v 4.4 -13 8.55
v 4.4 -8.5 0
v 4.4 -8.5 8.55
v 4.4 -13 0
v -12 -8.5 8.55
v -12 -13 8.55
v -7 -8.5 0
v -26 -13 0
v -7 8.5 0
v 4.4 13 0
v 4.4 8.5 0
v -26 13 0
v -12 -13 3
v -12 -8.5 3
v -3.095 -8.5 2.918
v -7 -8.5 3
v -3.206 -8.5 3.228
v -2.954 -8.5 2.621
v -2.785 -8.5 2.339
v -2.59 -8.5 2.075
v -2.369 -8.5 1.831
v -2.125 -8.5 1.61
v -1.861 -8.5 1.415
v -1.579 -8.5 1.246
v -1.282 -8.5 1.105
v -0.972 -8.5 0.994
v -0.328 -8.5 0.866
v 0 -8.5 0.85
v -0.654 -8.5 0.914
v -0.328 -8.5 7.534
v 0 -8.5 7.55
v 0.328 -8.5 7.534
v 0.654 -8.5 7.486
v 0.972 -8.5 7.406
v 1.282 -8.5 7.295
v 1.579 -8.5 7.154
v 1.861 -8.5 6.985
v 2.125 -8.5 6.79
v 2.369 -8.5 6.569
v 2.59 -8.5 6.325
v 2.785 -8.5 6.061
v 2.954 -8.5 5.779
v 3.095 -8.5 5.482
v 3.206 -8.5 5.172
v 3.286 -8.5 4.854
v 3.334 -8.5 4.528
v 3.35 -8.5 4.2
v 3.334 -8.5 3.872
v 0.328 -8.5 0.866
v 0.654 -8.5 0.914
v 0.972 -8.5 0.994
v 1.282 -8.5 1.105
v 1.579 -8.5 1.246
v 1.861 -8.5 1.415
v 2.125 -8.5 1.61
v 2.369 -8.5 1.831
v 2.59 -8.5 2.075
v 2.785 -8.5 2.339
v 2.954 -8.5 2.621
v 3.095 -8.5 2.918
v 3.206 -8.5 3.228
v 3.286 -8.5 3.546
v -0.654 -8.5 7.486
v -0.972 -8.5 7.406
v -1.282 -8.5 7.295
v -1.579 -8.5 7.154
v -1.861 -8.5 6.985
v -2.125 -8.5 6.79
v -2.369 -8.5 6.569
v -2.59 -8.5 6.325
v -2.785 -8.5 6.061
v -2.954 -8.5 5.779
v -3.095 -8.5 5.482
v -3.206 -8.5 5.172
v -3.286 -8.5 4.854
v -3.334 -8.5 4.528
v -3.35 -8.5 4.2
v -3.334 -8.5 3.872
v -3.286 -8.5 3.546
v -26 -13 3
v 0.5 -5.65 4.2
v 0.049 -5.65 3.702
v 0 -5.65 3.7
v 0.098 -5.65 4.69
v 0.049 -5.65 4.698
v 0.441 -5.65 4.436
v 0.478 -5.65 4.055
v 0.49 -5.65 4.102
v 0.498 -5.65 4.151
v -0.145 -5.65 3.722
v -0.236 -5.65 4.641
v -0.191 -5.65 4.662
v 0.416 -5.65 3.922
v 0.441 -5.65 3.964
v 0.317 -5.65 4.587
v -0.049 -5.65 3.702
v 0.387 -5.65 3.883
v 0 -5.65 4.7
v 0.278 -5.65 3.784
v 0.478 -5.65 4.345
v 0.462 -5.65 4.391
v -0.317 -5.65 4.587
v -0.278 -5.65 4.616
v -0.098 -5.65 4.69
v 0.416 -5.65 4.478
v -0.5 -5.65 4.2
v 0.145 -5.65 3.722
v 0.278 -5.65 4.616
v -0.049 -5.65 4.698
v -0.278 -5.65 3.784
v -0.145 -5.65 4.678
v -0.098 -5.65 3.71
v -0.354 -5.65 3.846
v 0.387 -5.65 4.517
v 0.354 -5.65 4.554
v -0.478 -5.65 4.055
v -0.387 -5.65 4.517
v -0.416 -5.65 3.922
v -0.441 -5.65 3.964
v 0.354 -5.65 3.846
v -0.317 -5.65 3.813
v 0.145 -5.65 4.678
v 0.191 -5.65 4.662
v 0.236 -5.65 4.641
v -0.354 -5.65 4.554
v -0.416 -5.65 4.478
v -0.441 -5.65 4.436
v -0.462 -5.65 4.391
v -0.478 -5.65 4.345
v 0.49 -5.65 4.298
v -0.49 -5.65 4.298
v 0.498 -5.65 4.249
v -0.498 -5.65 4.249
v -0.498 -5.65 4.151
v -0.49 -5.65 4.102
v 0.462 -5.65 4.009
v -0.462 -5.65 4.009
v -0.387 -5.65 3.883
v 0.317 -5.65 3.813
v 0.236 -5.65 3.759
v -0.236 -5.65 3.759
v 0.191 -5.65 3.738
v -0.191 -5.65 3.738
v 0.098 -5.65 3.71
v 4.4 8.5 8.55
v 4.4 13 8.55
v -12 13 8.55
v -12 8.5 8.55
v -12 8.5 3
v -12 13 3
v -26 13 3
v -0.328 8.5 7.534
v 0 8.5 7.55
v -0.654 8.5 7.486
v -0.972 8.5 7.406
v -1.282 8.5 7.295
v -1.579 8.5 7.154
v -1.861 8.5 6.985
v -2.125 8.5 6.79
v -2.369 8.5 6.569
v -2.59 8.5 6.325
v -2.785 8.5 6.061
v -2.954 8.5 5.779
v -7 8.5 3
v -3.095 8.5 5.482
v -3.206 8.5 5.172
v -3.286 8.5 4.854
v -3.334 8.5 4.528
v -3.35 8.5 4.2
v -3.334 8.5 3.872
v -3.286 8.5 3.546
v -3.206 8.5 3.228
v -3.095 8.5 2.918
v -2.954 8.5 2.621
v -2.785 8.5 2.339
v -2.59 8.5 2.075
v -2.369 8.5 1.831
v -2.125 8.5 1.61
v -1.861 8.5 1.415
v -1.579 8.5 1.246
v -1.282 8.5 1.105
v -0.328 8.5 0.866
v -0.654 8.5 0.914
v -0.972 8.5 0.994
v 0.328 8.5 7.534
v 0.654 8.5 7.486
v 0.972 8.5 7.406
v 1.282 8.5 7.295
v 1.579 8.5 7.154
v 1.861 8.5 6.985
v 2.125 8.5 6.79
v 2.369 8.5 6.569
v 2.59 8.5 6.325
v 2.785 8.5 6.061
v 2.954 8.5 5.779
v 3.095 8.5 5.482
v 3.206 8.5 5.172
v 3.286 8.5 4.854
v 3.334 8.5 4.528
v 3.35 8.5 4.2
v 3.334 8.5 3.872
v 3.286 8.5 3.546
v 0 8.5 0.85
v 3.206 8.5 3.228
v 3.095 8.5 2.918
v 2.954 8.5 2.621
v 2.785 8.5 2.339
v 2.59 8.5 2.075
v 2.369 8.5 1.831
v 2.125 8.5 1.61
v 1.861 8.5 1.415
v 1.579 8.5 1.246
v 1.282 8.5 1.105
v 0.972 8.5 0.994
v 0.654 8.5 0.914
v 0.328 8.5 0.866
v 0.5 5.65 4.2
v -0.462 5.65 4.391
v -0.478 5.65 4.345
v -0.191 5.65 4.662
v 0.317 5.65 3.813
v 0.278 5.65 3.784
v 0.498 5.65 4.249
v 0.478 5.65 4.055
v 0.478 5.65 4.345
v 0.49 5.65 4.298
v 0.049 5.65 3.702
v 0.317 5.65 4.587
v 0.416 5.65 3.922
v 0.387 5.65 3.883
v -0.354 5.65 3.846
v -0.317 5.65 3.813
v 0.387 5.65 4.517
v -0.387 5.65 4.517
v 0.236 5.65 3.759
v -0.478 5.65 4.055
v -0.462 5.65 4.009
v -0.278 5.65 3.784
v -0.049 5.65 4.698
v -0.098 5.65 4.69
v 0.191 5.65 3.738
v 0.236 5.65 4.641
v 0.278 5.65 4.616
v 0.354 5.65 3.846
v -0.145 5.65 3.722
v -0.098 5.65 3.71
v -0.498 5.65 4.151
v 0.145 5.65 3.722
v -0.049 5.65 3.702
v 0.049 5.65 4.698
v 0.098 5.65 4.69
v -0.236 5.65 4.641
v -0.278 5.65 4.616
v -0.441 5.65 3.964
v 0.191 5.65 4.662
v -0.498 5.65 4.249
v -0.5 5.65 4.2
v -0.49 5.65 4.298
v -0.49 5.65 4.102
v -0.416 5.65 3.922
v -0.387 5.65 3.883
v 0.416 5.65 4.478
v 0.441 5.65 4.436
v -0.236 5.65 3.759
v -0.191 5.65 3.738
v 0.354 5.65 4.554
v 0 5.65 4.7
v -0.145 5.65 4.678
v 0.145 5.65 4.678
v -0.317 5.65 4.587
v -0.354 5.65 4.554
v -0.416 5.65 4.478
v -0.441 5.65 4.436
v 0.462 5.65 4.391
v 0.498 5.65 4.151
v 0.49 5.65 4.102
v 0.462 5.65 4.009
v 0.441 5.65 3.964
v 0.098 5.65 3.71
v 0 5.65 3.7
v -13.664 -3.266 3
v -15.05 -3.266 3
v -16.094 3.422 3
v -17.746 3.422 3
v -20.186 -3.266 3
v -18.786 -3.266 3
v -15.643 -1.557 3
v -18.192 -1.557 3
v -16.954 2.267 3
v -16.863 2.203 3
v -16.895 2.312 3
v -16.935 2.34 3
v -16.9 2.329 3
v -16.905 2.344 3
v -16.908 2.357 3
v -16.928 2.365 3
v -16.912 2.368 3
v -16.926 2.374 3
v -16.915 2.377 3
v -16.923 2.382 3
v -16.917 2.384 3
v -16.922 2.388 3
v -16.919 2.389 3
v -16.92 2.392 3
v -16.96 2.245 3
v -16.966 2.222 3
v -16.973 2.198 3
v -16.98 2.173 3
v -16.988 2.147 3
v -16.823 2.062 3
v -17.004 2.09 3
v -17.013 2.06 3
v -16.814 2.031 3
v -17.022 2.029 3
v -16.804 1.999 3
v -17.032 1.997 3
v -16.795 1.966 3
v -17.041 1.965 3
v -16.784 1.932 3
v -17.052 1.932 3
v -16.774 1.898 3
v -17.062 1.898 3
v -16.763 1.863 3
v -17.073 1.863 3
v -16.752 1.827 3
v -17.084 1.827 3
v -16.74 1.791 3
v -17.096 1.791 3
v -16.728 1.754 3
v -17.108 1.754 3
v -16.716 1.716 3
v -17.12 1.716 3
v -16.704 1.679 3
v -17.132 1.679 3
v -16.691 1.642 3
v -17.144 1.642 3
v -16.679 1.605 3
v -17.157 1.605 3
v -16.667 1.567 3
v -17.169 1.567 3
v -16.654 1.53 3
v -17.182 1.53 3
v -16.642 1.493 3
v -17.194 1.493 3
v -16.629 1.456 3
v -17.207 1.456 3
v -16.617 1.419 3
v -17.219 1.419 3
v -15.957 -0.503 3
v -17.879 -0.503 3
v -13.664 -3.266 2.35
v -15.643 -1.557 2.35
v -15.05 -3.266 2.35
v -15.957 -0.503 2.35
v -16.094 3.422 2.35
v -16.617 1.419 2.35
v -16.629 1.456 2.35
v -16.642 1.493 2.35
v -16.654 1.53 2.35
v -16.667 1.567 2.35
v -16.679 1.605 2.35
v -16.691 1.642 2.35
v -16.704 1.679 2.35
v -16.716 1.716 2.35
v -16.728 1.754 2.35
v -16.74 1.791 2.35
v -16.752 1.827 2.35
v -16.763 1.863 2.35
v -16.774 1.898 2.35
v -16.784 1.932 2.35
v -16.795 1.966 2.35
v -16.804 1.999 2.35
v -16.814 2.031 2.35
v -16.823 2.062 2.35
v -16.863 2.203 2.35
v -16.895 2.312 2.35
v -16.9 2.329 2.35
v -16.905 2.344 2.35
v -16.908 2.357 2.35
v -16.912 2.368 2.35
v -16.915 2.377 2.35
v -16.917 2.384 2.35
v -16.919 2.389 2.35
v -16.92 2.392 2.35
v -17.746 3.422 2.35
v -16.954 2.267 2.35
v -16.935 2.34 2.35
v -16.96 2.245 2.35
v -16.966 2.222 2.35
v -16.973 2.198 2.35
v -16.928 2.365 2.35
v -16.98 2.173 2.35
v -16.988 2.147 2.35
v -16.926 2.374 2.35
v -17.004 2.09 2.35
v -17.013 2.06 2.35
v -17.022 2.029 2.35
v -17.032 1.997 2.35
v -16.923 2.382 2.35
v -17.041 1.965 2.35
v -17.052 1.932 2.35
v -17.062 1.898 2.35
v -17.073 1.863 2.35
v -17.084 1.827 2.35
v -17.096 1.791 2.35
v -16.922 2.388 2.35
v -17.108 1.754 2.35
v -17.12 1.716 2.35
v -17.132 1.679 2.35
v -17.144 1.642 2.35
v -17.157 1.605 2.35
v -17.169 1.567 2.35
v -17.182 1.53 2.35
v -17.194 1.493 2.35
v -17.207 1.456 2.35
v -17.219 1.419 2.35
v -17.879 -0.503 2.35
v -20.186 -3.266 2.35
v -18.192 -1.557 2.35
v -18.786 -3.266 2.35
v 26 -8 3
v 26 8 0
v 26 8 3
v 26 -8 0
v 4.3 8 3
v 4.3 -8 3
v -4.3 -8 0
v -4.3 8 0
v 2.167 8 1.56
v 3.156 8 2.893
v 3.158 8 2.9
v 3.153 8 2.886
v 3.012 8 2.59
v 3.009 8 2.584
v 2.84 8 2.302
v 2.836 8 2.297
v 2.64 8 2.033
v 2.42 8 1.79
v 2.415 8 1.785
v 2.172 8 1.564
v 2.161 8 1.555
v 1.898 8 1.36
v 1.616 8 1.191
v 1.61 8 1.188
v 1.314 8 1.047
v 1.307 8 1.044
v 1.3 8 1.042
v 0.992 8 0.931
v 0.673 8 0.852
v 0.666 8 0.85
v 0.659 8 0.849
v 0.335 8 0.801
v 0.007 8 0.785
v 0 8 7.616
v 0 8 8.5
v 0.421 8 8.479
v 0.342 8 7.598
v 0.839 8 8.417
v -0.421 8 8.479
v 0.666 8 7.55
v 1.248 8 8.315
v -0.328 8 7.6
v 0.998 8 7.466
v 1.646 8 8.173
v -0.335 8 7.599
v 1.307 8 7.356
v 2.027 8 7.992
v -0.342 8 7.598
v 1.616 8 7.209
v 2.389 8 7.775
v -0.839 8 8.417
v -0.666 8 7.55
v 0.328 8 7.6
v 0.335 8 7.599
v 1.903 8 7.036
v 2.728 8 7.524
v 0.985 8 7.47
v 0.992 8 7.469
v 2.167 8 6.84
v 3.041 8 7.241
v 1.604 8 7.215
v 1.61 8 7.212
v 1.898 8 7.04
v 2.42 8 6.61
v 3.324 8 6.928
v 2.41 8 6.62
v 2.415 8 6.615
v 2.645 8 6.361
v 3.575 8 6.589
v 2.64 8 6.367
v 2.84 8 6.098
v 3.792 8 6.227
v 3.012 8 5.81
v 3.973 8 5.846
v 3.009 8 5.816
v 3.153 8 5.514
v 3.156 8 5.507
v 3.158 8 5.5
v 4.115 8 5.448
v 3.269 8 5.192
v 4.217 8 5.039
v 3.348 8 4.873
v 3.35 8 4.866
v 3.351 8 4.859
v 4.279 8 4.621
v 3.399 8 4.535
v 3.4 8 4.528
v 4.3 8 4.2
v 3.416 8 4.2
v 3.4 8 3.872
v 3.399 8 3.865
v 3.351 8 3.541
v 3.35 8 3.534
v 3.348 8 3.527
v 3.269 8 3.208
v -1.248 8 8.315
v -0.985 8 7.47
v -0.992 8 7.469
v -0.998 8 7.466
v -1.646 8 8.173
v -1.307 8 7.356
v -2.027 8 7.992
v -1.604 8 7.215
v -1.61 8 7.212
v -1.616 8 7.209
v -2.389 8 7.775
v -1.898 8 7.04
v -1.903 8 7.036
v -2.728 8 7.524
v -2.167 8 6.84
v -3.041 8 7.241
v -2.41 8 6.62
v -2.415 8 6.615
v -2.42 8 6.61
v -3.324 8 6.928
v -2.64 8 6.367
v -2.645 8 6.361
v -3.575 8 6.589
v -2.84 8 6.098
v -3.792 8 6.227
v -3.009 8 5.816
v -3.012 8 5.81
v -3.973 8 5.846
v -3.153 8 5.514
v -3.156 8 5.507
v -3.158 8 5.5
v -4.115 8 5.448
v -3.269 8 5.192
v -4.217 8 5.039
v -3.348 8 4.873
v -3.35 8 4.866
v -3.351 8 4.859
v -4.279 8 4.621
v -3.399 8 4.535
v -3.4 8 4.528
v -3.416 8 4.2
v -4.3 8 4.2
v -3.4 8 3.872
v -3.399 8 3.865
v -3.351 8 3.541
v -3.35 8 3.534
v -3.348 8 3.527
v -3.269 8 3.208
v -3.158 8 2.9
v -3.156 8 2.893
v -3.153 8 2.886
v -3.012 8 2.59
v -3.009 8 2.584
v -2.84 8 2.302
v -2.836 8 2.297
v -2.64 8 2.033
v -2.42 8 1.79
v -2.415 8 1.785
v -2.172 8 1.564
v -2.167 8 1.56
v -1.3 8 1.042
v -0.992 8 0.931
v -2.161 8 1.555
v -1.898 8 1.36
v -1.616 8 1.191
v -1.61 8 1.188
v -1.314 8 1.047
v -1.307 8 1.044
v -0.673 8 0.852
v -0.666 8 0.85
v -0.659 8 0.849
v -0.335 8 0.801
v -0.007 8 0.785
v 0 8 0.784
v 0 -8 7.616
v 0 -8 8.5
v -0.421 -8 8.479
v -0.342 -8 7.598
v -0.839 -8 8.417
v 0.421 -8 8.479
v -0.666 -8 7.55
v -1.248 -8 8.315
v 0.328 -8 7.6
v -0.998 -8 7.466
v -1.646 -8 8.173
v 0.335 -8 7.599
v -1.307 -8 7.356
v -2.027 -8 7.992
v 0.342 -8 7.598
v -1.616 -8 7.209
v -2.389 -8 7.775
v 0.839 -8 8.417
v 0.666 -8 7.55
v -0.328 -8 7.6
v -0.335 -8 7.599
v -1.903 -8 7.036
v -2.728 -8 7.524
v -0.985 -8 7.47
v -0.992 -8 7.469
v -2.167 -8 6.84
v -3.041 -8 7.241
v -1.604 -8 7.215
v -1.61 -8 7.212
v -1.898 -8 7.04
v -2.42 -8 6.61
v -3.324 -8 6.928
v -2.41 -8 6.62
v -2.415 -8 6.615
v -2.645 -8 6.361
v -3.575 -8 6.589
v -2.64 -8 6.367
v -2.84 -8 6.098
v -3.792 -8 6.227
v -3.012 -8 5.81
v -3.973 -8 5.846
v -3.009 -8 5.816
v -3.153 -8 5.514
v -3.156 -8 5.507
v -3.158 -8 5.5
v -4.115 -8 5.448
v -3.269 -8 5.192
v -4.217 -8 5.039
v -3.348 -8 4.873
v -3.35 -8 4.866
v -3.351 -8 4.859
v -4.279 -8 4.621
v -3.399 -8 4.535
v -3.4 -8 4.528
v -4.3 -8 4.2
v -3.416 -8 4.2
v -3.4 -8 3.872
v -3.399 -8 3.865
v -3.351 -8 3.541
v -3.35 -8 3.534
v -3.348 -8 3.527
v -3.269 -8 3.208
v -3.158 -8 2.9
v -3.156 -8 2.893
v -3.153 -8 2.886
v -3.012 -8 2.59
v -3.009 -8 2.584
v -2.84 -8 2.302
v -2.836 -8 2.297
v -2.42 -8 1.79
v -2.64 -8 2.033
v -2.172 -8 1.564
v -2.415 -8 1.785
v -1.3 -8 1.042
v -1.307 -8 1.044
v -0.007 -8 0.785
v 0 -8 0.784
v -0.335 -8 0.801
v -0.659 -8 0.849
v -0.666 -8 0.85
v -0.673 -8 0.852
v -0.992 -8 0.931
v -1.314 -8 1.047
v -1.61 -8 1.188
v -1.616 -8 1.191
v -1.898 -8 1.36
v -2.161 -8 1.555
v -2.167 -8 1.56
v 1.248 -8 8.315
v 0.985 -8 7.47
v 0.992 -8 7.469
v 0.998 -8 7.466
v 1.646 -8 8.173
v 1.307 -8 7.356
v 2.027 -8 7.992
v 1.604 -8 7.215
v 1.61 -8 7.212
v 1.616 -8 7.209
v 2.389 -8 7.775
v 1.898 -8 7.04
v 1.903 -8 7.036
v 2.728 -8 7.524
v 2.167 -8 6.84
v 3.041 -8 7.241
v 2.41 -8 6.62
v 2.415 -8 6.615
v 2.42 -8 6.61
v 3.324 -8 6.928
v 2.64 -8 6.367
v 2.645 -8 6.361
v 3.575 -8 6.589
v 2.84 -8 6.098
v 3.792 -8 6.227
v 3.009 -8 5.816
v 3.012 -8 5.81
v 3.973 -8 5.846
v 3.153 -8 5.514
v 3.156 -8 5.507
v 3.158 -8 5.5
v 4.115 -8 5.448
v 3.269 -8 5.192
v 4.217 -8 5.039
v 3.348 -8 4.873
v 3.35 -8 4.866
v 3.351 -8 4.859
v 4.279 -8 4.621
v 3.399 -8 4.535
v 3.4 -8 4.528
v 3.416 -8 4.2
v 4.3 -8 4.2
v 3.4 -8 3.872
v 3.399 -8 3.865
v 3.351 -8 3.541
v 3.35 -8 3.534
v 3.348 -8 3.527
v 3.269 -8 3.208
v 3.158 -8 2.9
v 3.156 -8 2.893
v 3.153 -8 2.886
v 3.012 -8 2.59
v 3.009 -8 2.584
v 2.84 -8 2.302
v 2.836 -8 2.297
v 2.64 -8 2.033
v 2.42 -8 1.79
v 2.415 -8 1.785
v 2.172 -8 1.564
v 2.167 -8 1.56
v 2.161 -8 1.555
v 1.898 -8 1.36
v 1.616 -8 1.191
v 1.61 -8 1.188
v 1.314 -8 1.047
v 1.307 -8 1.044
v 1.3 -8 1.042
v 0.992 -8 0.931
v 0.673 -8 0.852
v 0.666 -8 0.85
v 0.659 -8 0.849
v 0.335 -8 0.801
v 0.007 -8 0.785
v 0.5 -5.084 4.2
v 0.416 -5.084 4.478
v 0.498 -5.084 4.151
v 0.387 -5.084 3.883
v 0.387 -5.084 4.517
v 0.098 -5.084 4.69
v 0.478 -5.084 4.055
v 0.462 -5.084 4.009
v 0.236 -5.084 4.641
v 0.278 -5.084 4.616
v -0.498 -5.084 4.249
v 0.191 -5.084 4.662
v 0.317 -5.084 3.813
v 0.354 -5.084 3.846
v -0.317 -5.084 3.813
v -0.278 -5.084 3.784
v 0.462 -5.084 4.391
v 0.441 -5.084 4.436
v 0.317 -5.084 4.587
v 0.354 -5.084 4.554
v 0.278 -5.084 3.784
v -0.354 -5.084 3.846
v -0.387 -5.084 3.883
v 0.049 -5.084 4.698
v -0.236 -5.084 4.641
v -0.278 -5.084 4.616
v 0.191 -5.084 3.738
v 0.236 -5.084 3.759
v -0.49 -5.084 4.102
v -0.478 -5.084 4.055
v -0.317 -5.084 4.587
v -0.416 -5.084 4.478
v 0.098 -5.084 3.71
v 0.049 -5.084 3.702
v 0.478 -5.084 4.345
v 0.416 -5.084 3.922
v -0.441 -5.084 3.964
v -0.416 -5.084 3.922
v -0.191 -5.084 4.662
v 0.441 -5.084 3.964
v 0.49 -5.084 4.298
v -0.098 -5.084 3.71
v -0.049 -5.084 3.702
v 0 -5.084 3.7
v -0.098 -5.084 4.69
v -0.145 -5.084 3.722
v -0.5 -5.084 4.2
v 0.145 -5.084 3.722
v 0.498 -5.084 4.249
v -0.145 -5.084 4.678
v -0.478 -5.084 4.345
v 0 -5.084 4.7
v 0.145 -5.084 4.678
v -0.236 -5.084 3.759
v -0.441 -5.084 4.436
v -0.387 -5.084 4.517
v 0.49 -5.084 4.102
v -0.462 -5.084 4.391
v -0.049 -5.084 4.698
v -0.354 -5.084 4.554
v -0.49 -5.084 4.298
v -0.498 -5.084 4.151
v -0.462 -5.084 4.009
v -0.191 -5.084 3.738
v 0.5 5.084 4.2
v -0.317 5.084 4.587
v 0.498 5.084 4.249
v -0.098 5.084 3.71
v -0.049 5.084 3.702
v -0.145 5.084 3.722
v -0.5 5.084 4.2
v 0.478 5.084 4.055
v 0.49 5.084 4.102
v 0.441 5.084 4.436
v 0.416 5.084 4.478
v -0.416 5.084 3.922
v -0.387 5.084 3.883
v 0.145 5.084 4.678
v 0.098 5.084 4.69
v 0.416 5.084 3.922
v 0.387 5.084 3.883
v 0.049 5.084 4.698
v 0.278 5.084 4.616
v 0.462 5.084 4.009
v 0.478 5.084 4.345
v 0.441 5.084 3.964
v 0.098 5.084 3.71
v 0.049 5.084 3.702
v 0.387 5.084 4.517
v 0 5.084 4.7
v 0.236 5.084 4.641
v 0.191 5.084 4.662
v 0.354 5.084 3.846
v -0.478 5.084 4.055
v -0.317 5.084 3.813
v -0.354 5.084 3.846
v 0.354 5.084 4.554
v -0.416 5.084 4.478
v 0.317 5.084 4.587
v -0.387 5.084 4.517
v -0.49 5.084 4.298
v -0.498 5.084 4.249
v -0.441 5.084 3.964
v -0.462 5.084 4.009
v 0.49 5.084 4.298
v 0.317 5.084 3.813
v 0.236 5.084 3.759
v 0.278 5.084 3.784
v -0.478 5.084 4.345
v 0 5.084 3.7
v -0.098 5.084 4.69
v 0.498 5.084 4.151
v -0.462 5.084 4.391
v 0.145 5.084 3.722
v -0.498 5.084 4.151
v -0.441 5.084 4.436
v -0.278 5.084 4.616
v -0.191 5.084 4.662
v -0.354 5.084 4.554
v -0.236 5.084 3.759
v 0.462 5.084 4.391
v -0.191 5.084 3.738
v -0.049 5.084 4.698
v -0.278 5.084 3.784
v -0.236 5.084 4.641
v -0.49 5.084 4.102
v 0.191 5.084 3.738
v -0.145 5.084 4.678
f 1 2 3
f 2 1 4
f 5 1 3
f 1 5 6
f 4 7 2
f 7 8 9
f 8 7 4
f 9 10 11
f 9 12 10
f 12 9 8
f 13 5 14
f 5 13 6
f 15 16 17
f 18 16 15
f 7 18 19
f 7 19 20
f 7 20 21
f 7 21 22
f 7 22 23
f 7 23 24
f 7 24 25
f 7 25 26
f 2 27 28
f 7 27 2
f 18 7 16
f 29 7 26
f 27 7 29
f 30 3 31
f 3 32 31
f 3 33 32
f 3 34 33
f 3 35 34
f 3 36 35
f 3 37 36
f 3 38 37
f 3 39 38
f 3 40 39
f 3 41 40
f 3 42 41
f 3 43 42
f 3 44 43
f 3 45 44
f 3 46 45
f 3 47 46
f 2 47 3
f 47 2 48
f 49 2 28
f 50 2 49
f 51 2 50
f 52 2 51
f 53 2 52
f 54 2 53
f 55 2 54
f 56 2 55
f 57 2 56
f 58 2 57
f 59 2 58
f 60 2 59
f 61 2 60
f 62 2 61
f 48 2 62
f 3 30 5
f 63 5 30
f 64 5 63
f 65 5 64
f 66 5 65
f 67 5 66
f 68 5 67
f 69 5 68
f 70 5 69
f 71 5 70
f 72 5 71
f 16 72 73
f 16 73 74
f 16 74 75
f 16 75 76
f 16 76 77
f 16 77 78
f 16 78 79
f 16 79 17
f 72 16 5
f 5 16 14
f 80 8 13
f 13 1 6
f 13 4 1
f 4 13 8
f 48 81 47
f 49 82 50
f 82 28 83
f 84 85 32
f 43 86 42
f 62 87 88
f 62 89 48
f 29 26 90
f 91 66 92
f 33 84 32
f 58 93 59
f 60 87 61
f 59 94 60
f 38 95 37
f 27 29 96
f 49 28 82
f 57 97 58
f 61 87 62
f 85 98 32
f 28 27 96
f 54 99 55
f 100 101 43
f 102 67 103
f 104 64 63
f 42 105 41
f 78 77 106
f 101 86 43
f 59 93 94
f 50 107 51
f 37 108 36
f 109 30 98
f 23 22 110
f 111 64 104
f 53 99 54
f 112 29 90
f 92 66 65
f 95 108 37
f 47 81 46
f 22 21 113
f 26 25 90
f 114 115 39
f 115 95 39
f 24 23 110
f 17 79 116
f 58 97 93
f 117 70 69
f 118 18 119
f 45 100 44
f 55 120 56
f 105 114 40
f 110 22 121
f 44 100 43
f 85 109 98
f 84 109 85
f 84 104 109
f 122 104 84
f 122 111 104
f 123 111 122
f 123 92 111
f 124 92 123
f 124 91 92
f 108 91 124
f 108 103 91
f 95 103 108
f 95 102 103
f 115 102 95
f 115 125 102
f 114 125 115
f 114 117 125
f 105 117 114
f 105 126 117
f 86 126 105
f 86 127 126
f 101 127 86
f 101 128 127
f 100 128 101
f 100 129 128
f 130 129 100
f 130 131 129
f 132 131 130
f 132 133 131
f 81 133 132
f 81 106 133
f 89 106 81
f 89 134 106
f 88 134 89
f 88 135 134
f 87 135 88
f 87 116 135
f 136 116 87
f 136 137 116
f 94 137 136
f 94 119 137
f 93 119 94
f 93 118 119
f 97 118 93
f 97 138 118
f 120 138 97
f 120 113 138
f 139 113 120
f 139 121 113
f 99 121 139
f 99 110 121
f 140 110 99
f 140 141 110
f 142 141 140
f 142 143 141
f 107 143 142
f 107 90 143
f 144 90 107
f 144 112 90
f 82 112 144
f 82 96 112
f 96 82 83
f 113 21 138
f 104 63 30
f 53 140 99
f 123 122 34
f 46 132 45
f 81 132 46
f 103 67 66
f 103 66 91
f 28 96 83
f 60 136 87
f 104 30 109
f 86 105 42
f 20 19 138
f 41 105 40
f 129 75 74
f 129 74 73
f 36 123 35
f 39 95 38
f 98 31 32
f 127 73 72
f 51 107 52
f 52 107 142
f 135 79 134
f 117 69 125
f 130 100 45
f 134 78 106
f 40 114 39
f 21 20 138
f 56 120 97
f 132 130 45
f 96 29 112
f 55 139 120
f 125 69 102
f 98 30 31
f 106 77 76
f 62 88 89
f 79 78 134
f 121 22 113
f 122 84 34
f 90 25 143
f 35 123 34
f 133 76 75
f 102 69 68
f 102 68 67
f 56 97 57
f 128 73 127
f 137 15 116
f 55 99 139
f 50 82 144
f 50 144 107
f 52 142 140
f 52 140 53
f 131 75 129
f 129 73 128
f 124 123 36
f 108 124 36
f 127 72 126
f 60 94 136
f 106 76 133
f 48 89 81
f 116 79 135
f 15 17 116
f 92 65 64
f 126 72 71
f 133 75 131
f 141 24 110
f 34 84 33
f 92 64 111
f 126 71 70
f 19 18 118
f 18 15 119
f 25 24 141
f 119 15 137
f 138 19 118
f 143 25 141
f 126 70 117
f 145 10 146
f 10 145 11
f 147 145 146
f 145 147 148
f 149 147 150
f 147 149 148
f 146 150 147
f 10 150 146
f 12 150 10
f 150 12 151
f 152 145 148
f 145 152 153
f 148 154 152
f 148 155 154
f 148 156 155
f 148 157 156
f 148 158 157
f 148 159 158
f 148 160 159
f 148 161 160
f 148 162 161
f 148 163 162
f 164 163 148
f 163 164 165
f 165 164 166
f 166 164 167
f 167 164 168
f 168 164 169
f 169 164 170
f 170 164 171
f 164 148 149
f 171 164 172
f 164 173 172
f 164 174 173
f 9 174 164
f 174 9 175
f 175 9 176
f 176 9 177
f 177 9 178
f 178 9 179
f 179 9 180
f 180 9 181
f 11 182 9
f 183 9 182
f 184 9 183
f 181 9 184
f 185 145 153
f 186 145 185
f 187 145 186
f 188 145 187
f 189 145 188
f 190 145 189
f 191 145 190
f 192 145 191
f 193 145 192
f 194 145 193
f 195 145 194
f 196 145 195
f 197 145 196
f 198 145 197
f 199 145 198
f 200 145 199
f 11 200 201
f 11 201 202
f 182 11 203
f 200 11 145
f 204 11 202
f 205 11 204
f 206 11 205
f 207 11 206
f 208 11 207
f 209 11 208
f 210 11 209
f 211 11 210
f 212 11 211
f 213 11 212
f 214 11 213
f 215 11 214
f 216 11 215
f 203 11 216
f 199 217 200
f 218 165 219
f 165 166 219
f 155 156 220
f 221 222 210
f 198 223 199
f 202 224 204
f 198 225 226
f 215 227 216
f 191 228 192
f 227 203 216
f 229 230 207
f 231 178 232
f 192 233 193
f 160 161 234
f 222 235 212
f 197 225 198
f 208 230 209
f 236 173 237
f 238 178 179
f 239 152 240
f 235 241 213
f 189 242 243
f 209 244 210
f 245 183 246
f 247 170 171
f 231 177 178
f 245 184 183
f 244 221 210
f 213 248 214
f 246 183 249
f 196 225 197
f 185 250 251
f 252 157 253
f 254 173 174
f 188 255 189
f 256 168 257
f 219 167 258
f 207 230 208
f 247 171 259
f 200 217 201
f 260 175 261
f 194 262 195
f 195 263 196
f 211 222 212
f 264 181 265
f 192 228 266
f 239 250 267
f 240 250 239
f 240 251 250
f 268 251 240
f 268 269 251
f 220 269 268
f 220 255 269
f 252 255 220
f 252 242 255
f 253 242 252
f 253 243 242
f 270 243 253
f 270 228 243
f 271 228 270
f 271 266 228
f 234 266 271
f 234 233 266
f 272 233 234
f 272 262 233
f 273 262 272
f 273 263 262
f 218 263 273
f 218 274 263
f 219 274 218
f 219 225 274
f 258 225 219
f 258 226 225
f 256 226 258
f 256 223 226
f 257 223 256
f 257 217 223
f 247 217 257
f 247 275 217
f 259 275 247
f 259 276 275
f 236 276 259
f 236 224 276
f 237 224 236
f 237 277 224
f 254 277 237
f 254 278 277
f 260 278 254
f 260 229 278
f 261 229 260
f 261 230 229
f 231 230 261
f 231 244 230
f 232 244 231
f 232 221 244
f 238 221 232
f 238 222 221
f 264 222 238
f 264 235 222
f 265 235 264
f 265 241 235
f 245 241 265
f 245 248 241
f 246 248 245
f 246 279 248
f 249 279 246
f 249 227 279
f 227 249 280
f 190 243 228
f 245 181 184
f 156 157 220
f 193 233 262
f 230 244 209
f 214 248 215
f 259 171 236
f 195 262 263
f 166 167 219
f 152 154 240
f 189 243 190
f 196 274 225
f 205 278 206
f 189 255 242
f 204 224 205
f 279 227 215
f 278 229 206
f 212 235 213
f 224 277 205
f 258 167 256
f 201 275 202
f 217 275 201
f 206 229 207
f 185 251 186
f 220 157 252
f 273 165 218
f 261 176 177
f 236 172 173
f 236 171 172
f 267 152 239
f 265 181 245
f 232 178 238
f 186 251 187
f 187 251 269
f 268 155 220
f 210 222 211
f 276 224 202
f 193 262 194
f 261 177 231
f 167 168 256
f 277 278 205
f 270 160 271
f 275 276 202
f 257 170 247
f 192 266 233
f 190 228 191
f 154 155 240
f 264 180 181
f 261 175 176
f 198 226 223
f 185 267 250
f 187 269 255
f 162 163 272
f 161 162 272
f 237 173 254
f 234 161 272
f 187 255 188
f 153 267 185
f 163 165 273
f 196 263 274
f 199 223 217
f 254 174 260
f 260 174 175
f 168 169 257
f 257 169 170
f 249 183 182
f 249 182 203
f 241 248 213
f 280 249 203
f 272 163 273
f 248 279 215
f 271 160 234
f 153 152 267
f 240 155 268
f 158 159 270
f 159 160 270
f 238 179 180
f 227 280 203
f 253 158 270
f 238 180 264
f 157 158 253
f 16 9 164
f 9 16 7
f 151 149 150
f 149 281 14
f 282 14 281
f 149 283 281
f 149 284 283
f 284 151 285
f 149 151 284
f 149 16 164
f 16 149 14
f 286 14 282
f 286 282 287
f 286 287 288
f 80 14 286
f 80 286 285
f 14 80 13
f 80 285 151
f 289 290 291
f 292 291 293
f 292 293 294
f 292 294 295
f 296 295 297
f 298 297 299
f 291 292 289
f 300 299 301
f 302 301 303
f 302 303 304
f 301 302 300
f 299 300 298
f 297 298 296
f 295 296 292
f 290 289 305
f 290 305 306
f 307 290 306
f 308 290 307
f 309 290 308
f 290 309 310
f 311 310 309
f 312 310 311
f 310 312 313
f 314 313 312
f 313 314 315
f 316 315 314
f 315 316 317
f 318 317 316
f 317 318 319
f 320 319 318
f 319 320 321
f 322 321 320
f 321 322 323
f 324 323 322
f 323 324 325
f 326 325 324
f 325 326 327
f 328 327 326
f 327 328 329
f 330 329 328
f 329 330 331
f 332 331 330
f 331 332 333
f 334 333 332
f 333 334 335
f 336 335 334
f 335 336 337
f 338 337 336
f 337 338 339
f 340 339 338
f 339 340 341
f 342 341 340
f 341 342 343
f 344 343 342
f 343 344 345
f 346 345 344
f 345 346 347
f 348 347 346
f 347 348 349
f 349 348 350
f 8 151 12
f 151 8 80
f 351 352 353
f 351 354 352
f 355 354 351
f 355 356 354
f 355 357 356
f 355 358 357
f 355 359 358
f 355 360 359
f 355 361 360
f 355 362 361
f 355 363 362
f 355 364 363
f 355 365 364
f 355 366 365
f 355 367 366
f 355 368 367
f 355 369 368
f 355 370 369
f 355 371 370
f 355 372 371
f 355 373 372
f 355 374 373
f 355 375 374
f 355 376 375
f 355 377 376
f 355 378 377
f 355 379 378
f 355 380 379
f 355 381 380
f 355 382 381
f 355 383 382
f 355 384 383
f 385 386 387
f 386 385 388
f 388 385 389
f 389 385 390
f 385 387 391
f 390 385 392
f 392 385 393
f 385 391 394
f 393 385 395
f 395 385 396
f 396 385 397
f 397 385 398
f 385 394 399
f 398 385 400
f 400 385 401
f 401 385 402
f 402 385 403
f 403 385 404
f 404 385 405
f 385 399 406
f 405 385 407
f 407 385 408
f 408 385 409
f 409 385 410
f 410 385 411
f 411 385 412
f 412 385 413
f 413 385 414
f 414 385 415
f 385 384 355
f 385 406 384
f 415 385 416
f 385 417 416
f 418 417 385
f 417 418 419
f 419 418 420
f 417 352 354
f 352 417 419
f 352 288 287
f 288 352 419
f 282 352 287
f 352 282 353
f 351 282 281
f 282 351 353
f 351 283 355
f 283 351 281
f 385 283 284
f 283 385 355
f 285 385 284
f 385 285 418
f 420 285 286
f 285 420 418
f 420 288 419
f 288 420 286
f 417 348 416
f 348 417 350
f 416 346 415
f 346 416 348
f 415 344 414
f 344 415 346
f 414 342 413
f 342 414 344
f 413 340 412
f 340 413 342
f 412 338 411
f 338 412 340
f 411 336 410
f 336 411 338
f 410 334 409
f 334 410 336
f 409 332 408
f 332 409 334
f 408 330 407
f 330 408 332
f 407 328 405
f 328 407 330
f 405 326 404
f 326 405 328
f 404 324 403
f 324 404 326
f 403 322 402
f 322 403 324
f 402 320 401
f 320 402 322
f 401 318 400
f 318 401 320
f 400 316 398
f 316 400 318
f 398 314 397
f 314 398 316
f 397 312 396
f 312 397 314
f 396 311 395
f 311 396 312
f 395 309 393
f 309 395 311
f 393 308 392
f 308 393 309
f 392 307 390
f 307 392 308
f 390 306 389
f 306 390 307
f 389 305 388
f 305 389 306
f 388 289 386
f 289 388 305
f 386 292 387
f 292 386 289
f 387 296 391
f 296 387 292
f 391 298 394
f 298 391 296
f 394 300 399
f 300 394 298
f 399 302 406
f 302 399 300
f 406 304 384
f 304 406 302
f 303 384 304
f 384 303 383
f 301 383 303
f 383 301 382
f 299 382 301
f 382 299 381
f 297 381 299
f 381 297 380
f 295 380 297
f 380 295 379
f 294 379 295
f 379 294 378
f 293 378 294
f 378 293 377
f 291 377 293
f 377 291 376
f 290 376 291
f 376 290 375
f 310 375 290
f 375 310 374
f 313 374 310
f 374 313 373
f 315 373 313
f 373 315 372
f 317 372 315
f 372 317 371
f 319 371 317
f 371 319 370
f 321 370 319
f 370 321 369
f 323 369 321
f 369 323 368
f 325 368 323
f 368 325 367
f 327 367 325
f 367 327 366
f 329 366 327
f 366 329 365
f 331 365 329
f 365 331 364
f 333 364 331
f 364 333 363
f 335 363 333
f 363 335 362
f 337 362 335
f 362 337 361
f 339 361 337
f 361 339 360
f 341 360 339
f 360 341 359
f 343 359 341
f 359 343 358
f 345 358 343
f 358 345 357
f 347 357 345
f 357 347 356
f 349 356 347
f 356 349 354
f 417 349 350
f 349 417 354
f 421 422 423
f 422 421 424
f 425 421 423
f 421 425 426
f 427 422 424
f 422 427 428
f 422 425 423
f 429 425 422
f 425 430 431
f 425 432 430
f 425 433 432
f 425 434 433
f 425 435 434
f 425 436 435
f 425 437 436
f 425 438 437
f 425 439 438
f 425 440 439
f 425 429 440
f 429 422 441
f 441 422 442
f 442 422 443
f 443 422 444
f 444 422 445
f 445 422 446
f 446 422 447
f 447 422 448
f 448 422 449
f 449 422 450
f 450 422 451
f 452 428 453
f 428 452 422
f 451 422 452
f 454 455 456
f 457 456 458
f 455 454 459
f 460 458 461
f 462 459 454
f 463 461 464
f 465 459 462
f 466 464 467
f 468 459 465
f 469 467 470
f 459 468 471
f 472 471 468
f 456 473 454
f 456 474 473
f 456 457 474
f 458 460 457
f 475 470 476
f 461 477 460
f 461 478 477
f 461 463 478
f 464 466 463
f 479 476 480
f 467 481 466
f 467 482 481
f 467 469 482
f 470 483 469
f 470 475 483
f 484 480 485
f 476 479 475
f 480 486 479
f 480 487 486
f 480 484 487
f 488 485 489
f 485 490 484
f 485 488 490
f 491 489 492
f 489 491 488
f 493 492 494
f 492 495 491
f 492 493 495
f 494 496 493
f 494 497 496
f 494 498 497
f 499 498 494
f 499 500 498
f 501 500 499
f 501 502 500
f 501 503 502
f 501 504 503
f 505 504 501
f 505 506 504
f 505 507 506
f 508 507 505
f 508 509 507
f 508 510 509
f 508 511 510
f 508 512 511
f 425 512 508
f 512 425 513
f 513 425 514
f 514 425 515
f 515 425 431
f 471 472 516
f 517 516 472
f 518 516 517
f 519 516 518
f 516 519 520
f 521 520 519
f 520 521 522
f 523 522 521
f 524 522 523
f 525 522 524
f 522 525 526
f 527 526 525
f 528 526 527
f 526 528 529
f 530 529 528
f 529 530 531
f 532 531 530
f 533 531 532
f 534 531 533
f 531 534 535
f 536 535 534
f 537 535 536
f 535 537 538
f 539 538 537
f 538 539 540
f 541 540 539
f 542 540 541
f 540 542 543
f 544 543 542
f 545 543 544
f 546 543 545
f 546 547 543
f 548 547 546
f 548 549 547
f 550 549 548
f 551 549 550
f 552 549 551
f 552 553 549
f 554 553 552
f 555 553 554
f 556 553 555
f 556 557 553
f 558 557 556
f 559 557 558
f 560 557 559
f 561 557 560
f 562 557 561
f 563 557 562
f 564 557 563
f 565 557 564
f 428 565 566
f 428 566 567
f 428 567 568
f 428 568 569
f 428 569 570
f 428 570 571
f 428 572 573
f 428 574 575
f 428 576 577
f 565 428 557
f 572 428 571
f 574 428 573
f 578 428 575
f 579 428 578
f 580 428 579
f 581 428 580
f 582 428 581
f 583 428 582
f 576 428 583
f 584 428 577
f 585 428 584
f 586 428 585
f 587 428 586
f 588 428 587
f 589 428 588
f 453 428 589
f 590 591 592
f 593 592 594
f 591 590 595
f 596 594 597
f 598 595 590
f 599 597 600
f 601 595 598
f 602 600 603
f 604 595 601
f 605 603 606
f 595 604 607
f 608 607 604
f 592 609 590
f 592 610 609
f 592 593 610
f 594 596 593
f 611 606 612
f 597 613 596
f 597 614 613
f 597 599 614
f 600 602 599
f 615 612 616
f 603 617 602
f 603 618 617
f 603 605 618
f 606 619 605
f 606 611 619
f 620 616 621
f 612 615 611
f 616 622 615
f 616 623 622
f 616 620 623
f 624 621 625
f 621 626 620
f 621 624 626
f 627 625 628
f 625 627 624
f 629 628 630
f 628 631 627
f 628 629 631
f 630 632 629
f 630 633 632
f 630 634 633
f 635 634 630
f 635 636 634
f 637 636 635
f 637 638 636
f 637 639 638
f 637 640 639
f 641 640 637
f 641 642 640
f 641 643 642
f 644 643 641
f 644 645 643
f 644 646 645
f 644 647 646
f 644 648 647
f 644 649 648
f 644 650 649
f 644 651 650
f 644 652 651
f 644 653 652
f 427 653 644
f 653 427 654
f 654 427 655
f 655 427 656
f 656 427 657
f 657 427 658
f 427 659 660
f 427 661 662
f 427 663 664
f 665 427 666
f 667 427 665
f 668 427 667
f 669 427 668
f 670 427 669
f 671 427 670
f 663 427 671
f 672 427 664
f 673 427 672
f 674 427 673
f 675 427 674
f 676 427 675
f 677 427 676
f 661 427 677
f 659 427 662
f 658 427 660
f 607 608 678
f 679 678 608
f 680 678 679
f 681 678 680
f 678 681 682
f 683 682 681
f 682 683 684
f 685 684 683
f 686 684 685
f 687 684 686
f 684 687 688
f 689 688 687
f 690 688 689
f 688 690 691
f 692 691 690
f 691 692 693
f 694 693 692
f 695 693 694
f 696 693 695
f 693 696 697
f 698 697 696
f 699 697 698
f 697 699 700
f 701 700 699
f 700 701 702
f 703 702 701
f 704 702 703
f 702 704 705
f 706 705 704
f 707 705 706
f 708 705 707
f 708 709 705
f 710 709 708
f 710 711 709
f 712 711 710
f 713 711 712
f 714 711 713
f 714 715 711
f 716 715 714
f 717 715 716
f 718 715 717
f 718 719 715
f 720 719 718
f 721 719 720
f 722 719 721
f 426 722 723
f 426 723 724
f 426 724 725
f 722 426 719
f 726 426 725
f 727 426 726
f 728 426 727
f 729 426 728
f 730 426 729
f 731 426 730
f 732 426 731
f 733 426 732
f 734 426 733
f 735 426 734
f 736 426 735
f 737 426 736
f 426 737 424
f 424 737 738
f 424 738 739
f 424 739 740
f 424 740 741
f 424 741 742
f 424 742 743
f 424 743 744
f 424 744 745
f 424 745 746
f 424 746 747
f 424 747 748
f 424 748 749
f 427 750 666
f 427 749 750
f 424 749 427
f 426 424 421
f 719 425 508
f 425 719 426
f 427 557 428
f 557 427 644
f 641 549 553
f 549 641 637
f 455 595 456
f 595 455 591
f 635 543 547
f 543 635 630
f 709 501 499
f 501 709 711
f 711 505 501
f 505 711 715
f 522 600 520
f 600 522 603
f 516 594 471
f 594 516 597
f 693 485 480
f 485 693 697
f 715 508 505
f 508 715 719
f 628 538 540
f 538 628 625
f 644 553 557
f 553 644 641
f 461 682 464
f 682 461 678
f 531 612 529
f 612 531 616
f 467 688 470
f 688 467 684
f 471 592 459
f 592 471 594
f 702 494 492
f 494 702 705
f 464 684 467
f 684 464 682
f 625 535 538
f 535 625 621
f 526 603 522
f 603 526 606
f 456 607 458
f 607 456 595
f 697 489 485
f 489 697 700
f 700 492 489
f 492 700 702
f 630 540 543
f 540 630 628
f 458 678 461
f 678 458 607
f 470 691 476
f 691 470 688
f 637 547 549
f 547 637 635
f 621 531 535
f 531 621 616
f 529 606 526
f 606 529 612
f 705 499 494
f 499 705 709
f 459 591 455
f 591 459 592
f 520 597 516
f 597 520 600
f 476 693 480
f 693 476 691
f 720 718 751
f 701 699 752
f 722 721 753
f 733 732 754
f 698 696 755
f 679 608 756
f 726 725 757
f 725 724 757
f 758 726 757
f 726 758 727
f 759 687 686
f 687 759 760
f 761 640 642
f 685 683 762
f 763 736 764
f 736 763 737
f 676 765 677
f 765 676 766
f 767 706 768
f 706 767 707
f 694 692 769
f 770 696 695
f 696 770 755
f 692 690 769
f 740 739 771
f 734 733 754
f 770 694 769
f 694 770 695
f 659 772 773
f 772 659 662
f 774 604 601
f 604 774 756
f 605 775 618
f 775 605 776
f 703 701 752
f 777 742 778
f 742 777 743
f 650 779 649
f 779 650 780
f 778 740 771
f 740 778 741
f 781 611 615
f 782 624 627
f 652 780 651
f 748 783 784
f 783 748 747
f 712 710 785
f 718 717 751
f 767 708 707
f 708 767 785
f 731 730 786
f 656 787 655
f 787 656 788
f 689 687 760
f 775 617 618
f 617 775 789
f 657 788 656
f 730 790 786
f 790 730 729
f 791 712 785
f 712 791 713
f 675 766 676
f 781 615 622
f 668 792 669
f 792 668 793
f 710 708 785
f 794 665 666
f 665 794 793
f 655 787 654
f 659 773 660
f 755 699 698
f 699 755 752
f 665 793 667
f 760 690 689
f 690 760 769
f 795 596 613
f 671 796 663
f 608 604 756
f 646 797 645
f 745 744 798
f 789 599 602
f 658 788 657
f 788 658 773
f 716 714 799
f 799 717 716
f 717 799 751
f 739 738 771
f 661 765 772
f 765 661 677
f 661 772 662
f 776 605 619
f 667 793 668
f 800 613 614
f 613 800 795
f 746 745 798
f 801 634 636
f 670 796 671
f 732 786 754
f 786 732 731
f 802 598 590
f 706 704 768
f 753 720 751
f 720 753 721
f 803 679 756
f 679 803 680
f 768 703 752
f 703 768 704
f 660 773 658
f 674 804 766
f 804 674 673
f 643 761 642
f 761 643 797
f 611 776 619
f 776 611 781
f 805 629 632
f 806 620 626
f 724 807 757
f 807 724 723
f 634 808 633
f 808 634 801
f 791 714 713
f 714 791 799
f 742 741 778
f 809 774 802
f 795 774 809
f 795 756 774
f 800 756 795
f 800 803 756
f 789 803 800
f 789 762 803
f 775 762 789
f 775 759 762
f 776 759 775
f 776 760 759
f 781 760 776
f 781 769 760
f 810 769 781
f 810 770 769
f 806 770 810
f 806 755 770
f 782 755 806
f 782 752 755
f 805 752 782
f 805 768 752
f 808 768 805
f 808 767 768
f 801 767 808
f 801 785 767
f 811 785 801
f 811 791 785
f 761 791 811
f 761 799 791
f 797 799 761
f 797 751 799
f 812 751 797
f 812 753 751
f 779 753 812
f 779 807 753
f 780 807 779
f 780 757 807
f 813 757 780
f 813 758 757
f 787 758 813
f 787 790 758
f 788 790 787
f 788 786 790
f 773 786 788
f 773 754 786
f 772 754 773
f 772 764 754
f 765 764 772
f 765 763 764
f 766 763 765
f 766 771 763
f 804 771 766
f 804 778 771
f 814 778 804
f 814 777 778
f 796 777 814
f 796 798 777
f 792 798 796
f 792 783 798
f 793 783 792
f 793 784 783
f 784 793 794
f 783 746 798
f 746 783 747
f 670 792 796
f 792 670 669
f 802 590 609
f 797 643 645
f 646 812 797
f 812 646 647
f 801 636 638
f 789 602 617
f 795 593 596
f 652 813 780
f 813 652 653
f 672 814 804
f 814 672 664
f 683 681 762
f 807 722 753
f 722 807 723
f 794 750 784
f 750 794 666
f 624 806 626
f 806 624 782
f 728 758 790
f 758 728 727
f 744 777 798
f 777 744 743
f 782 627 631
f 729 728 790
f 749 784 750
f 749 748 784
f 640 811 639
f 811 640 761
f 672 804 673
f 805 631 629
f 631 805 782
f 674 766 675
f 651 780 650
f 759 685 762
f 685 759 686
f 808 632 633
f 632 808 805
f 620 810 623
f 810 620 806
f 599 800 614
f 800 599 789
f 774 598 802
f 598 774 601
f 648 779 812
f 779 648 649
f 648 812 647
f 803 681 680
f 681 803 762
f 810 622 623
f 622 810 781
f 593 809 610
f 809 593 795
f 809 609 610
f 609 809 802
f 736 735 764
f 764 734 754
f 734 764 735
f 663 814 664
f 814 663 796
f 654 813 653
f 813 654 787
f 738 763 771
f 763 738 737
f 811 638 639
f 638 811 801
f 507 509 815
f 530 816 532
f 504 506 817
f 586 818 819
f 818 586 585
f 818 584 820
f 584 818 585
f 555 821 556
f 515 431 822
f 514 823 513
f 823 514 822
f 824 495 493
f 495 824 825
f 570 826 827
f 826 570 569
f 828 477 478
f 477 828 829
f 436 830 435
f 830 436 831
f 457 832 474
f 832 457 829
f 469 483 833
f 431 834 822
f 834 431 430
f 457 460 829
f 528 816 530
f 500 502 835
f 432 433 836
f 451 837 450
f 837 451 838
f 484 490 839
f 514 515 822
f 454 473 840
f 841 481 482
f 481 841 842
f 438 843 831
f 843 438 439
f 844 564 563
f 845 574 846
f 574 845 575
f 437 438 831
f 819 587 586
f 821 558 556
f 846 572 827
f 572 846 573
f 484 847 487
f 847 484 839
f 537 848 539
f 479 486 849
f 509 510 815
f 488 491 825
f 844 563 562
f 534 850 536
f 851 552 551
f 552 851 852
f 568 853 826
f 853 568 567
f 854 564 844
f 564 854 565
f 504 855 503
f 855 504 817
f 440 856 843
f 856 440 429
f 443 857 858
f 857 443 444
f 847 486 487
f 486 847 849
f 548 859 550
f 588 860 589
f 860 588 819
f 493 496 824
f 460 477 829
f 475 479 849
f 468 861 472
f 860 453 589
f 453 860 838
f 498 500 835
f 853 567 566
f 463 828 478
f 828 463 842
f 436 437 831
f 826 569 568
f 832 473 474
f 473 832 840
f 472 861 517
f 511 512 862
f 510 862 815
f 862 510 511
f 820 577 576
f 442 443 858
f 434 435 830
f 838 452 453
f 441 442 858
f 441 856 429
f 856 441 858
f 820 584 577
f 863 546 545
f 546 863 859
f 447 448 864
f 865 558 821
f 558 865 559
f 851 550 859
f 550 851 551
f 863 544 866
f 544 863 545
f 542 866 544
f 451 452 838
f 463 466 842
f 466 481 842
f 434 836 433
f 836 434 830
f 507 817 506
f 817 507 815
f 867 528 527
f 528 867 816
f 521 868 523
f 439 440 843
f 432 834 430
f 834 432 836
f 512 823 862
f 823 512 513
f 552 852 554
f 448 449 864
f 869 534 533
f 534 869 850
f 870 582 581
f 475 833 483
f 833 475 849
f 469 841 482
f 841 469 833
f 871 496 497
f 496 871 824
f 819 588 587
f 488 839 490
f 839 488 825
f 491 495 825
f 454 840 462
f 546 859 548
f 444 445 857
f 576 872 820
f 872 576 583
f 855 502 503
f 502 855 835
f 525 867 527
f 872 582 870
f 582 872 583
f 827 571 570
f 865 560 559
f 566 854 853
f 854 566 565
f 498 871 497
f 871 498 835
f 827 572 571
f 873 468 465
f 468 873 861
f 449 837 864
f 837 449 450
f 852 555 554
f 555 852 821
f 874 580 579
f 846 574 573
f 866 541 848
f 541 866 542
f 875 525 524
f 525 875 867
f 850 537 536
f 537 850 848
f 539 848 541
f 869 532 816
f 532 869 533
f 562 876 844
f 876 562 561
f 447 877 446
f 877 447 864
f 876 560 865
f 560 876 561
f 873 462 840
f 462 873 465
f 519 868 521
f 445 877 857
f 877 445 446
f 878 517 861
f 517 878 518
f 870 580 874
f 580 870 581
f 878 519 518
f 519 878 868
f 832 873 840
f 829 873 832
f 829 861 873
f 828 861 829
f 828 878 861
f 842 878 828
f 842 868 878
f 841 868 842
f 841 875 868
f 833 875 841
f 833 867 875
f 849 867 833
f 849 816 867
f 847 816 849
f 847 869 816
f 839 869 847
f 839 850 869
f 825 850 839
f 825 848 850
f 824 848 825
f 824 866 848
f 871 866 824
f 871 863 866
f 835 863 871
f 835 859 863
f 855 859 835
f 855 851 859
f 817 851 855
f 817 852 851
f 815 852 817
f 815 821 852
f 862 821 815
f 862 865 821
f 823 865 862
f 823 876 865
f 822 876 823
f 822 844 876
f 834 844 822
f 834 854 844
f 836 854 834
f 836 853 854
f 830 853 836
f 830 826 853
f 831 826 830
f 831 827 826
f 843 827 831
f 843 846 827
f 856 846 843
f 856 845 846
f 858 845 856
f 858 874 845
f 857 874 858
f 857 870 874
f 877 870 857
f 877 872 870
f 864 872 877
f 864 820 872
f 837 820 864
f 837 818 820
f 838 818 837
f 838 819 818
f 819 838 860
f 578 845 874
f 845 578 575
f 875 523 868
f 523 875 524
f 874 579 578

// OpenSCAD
// Opposed cone bearings adapted from the CrowPanel folding stand.
// Units mm. Print as supplied, broad feet on the build plate.
part="test"; // test, left, right, section
gap=0.4; // normal clearance, use 0.5 if the first print fuses
$fn=64;
axis_height=4.2;
radius=3.35;
cone_depth=2.85;
axial_gap=0.5;
// Hinge axis is Y. The cheeks and socket feet all touch the bed.
module cone(y,d,clearance=0){
    translate([0,y,axis_height]) rotate([-90*d,0,0])
        cylinder(h=cone_depth+clearance*sqrt(2),
        r1=radius+clearance*sqrt(2),r2=radius-cone_depth);
}
module foot(x0,x1,y0,y1,h){
    translate([x0,y0,0]) cube([x1-x0,y1-y0,h]);
}
module left_unmarked(){
    union(){
        foot(-26,-7,-13,13,3);
        // Each cheek connects to its own broad foot.
        for(d=[-1,1]){
            foot(-12,4.4,d<0?-13:8.5,d<0?-8.5:13,axis_height+radius+1);
            cone(d*8.5,-d);
        }
    }
}
module right_untrimmed(){
    difference(){
        union(){
            foot(7,26,-8,8,3);
            foot(0,12,-8,8,3);
            // Round top, bed-supported lower half, like the earlier stand.
            foot(-4.3,4.3,-8,8,axis_height);
            translate([0,-8,axis_height]) rotate([-90,0,0])
                cylinder(h=16,r=4.3);
        }
        for(d=[-1,1]) cone(d*8.5,-d,gap);
    }
}
// Trim the barrel's 0.10 mm protrusion so both flat feet seat on Z=0.
module right(){
 intersection(){right_untrimmed();translate([-40,-20,0])cube([80,40,30]);}
}
module left(){
 difference(){
  left_unmarked();
  translate([-17,0,2.35])linear_extrude(0.8)
   text("A",size=7,font="Liberation Sans:style=Bold",halign="center",valign="center");
 }
}
if(part=="test"){left();right();}
if(part=="left")left();
if(part=="right")right();
if(part=="section")intersection(){
    union(){left();right();}
    translate([-30,-20,-1])cube([60,20,20]);
}
